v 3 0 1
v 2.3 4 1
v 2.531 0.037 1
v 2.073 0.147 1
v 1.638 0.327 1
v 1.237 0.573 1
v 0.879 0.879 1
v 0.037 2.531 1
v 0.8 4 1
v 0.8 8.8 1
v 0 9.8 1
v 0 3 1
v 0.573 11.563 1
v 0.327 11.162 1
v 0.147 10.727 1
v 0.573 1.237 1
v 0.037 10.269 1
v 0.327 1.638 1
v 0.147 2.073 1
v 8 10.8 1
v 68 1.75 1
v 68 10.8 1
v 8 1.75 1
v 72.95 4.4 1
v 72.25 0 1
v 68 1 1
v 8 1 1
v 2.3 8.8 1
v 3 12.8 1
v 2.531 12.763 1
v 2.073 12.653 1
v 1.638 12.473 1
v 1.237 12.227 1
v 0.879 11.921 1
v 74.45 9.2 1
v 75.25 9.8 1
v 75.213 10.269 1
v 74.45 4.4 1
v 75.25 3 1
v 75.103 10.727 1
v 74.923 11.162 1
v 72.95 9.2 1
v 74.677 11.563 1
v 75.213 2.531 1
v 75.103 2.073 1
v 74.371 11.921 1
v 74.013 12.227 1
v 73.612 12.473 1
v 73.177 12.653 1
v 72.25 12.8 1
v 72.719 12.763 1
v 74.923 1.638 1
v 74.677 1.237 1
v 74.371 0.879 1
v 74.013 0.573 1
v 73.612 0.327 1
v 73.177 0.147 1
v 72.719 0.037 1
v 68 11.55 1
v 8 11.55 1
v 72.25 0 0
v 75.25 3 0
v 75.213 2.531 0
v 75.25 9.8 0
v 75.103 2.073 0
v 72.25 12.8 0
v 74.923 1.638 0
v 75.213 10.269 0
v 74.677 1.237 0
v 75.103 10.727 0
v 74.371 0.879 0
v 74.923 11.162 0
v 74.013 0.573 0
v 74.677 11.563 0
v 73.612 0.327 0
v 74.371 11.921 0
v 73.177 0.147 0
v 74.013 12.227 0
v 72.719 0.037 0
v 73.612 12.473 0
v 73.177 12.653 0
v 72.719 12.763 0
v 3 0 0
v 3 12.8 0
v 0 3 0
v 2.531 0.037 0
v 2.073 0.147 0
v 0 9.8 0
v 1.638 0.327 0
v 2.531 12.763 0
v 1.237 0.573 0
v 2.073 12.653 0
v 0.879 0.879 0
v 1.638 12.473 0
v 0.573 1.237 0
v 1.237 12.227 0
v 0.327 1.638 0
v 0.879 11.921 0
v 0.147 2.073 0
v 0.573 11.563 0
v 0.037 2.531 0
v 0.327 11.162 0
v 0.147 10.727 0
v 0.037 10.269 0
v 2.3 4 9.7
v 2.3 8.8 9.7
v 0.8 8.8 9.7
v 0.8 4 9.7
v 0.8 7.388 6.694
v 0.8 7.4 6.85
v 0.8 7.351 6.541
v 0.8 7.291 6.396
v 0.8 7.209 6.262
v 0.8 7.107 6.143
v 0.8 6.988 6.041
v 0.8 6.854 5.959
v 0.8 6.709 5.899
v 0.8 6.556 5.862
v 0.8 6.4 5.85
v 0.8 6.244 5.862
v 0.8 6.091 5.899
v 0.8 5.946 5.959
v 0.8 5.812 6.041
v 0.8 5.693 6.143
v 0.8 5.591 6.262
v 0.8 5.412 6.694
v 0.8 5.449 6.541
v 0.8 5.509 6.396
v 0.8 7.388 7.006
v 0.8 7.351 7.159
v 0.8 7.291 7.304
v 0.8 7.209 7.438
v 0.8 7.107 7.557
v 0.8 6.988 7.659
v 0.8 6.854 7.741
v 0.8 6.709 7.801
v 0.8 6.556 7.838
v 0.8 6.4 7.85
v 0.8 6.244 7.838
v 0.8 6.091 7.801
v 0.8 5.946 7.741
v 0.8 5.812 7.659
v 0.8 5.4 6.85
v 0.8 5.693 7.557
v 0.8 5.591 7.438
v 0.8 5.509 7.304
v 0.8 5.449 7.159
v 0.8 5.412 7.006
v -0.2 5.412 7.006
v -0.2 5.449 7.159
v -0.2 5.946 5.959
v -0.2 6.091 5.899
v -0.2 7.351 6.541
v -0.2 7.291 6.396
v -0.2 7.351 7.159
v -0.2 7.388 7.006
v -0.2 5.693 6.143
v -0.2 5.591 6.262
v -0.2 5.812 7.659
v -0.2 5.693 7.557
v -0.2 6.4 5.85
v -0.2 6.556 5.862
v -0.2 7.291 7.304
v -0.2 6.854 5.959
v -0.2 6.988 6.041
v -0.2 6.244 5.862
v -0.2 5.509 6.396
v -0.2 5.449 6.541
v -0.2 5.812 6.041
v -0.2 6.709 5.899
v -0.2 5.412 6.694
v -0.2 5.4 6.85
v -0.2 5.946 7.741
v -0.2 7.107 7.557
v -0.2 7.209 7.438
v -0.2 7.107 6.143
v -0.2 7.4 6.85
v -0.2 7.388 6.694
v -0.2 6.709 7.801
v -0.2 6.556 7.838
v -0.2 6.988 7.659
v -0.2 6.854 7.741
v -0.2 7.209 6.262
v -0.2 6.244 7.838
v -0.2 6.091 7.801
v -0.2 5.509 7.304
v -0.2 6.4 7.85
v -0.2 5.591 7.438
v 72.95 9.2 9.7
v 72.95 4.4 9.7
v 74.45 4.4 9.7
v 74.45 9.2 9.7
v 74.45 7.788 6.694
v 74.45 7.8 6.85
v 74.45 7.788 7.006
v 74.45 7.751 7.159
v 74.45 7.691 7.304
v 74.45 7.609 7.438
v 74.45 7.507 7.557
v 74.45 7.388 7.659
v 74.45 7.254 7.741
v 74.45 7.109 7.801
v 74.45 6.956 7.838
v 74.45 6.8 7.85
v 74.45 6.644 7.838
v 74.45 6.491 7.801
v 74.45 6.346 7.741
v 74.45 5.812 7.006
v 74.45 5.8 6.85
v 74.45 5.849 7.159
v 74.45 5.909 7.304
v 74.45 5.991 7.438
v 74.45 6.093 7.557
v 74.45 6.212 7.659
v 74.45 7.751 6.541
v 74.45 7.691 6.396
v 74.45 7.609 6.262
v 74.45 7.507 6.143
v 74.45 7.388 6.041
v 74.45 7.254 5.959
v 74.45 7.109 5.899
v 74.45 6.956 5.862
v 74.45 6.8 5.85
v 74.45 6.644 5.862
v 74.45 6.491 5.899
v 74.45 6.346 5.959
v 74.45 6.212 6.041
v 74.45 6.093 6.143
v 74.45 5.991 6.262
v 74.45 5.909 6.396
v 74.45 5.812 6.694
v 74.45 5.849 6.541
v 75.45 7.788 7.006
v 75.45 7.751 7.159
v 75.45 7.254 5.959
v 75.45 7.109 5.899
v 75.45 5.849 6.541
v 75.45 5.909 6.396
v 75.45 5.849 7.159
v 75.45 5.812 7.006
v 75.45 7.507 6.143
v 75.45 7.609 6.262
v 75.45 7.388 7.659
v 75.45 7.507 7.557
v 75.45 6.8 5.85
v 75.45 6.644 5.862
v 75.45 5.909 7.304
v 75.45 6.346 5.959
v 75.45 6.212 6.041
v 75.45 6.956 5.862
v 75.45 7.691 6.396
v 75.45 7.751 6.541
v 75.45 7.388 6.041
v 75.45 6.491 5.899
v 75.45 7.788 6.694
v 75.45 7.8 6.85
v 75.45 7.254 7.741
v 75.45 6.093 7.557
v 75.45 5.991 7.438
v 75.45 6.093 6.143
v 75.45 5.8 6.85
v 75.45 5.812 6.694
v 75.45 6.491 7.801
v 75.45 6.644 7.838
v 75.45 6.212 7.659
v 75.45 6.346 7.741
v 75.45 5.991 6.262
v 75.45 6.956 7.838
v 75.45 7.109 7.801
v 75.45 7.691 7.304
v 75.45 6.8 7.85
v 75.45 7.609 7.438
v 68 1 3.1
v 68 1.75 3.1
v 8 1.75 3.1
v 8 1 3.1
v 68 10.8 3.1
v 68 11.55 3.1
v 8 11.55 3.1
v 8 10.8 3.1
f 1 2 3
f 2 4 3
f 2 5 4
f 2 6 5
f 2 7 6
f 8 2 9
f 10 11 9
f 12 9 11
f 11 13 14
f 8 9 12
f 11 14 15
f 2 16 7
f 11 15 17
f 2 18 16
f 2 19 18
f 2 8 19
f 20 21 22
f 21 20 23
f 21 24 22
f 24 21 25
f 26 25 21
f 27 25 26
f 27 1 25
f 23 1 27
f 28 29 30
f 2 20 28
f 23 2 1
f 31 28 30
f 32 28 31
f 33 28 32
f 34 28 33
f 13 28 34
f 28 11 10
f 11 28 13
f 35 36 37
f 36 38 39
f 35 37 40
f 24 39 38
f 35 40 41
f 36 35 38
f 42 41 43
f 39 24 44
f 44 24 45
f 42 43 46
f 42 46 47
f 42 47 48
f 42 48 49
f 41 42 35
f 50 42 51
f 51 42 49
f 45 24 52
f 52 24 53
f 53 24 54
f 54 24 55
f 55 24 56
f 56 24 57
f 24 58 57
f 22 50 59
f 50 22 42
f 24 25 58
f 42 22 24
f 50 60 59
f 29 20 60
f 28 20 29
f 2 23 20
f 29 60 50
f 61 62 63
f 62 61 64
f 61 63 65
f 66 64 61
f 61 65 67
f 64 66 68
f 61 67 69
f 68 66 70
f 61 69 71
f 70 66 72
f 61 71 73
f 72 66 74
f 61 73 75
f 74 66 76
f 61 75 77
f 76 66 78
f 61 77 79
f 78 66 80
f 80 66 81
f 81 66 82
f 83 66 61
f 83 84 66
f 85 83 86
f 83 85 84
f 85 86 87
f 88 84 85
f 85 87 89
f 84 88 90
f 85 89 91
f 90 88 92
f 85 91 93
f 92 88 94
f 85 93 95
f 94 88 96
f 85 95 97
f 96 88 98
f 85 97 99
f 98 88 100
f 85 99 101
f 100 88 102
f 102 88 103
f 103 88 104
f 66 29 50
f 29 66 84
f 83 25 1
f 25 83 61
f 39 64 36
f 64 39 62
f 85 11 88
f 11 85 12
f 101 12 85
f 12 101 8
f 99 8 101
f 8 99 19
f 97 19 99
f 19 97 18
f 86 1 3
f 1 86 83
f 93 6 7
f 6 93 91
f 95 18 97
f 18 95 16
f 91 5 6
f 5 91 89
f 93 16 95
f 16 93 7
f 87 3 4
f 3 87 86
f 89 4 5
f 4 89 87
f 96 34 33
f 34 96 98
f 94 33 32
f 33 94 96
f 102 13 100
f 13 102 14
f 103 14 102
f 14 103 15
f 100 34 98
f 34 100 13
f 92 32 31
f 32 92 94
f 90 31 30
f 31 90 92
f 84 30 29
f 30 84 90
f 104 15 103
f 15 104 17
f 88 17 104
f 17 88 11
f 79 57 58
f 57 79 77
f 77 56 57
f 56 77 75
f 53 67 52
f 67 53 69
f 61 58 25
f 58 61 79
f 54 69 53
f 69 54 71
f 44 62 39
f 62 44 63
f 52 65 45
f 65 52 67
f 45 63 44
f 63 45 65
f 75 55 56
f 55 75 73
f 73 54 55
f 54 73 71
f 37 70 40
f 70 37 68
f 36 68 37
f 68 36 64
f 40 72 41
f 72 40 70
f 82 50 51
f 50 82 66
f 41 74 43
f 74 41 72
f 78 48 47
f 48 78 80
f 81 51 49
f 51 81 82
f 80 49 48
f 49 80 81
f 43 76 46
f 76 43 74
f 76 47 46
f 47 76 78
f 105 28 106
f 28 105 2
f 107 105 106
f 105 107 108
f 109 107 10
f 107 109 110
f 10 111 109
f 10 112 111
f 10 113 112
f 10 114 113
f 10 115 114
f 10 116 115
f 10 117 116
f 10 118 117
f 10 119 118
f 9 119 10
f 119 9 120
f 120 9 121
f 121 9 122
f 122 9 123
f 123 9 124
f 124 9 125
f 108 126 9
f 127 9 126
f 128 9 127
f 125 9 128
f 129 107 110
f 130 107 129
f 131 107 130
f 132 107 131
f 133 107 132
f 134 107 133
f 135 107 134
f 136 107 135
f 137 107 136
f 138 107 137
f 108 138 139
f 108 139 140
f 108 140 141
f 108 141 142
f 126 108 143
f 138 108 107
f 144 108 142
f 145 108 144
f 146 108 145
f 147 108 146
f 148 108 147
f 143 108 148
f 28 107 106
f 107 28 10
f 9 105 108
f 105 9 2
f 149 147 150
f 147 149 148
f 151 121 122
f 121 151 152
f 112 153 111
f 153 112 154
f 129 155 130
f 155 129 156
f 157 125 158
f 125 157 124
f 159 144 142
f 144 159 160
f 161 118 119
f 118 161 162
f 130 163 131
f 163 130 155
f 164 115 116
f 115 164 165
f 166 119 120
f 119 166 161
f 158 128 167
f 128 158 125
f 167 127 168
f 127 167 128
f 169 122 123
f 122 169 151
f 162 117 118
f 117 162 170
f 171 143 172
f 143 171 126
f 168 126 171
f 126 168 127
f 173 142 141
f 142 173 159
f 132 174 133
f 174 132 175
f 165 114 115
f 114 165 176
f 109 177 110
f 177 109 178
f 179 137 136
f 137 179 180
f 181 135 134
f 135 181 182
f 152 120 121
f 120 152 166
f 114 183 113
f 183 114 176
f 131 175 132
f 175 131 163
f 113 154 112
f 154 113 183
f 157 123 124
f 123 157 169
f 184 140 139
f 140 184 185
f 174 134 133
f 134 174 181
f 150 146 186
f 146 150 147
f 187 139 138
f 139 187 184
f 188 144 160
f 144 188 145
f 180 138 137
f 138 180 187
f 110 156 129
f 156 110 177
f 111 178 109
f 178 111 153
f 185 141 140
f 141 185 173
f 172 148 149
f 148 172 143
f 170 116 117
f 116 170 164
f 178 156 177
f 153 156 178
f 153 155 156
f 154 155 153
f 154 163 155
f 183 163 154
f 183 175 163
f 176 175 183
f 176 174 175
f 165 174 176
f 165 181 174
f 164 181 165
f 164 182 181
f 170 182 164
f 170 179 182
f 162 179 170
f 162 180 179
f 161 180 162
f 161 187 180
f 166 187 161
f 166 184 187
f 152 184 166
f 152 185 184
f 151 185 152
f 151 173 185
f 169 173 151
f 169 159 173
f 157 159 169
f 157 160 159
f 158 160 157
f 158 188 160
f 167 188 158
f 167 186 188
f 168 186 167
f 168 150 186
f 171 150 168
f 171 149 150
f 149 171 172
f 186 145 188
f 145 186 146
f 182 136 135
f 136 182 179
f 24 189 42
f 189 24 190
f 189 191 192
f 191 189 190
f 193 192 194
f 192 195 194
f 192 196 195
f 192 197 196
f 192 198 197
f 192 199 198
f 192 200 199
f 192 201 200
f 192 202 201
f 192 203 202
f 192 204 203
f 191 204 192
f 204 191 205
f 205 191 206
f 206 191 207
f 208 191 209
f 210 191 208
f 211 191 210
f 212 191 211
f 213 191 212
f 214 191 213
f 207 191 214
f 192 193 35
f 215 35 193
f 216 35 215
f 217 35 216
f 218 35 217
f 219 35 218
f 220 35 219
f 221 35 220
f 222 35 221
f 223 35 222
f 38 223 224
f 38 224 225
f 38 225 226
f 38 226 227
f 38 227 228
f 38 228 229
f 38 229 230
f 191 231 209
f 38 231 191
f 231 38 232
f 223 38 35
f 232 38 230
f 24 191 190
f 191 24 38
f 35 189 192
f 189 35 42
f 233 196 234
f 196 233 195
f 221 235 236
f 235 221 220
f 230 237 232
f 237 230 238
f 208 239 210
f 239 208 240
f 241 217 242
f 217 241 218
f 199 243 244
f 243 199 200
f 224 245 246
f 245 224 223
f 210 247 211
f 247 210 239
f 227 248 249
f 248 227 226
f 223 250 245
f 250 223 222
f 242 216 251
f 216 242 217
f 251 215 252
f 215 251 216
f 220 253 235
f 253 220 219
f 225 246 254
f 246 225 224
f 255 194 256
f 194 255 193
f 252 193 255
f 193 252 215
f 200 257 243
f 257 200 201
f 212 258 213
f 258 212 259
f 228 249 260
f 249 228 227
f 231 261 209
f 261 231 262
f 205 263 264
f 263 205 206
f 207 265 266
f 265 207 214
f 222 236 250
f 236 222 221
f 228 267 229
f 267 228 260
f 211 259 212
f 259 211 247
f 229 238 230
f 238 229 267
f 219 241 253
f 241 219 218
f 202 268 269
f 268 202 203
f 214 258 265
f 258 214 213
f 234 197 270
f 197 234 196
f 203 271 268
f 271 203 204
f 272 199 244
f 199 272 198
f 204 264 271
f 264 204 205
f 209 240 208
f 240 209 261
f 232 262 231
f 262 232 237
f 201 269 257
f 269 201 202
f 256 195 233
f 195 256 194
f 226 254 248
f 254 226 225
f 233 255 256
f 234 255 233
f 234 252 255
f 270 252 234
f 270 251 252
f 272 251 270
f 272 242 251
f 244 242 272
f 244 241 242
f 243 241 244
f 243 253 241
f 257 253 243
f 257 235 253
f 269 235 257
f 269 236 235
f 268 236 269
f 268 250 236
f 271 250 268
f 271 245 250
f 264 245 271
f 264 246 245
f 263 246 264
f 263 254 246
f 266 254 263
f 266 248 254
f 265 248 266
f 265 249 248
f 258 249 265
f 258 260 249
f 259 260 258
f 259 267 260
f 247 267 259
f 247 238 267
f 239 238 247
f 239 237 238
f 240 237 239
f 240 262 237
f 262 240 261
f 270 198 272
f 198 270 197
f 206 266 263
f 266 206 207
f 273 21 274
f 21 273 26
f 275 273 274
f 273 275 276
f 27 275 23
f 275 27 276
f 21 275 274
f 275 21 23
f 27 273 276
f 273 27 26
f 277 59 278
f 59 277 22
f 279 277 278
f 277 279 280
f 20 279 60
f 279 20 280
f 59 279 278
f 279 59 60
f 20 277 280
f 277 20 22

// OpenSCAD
module corner (){
    cylinder(r = 3, h = 1, $fn = 40);
}
module back () {
    //color ([1,0,0])
    //cylinder(r = 2, h = 25, $fn = 40);
    translate([3,0,0]) cube ([69.25,12.8,1 ]);
    translate([0,3,0]) cube ([75.25,6.8,1 ]);
    translate([3,3,0]) corner();
    translate([3,9.8,0]) corner();
    translate([72.25,3,0]) corner();
    translate([72.25,9.8,0]) corner();
}
    

module pin (){
    cube ([1.5,4.8,8.7 ]);
    translate ([-1,2.4,5.85]) 
        rotate ([0,90,0]) 
        cylinder(r = 1.0, h = 1, $fn = 40);
}


back();
translate ([0.8,4,1]) pin();
translate ([1.5+75.25-1.5-.8,4.8+4.4,1]) rotate ([0,0,180]) pin();

translate ([8,1,1]) cube ([60,.75,2.1 ]);
translate ([8,10.8,1]) cube ([60,.75,2.1 ]);
